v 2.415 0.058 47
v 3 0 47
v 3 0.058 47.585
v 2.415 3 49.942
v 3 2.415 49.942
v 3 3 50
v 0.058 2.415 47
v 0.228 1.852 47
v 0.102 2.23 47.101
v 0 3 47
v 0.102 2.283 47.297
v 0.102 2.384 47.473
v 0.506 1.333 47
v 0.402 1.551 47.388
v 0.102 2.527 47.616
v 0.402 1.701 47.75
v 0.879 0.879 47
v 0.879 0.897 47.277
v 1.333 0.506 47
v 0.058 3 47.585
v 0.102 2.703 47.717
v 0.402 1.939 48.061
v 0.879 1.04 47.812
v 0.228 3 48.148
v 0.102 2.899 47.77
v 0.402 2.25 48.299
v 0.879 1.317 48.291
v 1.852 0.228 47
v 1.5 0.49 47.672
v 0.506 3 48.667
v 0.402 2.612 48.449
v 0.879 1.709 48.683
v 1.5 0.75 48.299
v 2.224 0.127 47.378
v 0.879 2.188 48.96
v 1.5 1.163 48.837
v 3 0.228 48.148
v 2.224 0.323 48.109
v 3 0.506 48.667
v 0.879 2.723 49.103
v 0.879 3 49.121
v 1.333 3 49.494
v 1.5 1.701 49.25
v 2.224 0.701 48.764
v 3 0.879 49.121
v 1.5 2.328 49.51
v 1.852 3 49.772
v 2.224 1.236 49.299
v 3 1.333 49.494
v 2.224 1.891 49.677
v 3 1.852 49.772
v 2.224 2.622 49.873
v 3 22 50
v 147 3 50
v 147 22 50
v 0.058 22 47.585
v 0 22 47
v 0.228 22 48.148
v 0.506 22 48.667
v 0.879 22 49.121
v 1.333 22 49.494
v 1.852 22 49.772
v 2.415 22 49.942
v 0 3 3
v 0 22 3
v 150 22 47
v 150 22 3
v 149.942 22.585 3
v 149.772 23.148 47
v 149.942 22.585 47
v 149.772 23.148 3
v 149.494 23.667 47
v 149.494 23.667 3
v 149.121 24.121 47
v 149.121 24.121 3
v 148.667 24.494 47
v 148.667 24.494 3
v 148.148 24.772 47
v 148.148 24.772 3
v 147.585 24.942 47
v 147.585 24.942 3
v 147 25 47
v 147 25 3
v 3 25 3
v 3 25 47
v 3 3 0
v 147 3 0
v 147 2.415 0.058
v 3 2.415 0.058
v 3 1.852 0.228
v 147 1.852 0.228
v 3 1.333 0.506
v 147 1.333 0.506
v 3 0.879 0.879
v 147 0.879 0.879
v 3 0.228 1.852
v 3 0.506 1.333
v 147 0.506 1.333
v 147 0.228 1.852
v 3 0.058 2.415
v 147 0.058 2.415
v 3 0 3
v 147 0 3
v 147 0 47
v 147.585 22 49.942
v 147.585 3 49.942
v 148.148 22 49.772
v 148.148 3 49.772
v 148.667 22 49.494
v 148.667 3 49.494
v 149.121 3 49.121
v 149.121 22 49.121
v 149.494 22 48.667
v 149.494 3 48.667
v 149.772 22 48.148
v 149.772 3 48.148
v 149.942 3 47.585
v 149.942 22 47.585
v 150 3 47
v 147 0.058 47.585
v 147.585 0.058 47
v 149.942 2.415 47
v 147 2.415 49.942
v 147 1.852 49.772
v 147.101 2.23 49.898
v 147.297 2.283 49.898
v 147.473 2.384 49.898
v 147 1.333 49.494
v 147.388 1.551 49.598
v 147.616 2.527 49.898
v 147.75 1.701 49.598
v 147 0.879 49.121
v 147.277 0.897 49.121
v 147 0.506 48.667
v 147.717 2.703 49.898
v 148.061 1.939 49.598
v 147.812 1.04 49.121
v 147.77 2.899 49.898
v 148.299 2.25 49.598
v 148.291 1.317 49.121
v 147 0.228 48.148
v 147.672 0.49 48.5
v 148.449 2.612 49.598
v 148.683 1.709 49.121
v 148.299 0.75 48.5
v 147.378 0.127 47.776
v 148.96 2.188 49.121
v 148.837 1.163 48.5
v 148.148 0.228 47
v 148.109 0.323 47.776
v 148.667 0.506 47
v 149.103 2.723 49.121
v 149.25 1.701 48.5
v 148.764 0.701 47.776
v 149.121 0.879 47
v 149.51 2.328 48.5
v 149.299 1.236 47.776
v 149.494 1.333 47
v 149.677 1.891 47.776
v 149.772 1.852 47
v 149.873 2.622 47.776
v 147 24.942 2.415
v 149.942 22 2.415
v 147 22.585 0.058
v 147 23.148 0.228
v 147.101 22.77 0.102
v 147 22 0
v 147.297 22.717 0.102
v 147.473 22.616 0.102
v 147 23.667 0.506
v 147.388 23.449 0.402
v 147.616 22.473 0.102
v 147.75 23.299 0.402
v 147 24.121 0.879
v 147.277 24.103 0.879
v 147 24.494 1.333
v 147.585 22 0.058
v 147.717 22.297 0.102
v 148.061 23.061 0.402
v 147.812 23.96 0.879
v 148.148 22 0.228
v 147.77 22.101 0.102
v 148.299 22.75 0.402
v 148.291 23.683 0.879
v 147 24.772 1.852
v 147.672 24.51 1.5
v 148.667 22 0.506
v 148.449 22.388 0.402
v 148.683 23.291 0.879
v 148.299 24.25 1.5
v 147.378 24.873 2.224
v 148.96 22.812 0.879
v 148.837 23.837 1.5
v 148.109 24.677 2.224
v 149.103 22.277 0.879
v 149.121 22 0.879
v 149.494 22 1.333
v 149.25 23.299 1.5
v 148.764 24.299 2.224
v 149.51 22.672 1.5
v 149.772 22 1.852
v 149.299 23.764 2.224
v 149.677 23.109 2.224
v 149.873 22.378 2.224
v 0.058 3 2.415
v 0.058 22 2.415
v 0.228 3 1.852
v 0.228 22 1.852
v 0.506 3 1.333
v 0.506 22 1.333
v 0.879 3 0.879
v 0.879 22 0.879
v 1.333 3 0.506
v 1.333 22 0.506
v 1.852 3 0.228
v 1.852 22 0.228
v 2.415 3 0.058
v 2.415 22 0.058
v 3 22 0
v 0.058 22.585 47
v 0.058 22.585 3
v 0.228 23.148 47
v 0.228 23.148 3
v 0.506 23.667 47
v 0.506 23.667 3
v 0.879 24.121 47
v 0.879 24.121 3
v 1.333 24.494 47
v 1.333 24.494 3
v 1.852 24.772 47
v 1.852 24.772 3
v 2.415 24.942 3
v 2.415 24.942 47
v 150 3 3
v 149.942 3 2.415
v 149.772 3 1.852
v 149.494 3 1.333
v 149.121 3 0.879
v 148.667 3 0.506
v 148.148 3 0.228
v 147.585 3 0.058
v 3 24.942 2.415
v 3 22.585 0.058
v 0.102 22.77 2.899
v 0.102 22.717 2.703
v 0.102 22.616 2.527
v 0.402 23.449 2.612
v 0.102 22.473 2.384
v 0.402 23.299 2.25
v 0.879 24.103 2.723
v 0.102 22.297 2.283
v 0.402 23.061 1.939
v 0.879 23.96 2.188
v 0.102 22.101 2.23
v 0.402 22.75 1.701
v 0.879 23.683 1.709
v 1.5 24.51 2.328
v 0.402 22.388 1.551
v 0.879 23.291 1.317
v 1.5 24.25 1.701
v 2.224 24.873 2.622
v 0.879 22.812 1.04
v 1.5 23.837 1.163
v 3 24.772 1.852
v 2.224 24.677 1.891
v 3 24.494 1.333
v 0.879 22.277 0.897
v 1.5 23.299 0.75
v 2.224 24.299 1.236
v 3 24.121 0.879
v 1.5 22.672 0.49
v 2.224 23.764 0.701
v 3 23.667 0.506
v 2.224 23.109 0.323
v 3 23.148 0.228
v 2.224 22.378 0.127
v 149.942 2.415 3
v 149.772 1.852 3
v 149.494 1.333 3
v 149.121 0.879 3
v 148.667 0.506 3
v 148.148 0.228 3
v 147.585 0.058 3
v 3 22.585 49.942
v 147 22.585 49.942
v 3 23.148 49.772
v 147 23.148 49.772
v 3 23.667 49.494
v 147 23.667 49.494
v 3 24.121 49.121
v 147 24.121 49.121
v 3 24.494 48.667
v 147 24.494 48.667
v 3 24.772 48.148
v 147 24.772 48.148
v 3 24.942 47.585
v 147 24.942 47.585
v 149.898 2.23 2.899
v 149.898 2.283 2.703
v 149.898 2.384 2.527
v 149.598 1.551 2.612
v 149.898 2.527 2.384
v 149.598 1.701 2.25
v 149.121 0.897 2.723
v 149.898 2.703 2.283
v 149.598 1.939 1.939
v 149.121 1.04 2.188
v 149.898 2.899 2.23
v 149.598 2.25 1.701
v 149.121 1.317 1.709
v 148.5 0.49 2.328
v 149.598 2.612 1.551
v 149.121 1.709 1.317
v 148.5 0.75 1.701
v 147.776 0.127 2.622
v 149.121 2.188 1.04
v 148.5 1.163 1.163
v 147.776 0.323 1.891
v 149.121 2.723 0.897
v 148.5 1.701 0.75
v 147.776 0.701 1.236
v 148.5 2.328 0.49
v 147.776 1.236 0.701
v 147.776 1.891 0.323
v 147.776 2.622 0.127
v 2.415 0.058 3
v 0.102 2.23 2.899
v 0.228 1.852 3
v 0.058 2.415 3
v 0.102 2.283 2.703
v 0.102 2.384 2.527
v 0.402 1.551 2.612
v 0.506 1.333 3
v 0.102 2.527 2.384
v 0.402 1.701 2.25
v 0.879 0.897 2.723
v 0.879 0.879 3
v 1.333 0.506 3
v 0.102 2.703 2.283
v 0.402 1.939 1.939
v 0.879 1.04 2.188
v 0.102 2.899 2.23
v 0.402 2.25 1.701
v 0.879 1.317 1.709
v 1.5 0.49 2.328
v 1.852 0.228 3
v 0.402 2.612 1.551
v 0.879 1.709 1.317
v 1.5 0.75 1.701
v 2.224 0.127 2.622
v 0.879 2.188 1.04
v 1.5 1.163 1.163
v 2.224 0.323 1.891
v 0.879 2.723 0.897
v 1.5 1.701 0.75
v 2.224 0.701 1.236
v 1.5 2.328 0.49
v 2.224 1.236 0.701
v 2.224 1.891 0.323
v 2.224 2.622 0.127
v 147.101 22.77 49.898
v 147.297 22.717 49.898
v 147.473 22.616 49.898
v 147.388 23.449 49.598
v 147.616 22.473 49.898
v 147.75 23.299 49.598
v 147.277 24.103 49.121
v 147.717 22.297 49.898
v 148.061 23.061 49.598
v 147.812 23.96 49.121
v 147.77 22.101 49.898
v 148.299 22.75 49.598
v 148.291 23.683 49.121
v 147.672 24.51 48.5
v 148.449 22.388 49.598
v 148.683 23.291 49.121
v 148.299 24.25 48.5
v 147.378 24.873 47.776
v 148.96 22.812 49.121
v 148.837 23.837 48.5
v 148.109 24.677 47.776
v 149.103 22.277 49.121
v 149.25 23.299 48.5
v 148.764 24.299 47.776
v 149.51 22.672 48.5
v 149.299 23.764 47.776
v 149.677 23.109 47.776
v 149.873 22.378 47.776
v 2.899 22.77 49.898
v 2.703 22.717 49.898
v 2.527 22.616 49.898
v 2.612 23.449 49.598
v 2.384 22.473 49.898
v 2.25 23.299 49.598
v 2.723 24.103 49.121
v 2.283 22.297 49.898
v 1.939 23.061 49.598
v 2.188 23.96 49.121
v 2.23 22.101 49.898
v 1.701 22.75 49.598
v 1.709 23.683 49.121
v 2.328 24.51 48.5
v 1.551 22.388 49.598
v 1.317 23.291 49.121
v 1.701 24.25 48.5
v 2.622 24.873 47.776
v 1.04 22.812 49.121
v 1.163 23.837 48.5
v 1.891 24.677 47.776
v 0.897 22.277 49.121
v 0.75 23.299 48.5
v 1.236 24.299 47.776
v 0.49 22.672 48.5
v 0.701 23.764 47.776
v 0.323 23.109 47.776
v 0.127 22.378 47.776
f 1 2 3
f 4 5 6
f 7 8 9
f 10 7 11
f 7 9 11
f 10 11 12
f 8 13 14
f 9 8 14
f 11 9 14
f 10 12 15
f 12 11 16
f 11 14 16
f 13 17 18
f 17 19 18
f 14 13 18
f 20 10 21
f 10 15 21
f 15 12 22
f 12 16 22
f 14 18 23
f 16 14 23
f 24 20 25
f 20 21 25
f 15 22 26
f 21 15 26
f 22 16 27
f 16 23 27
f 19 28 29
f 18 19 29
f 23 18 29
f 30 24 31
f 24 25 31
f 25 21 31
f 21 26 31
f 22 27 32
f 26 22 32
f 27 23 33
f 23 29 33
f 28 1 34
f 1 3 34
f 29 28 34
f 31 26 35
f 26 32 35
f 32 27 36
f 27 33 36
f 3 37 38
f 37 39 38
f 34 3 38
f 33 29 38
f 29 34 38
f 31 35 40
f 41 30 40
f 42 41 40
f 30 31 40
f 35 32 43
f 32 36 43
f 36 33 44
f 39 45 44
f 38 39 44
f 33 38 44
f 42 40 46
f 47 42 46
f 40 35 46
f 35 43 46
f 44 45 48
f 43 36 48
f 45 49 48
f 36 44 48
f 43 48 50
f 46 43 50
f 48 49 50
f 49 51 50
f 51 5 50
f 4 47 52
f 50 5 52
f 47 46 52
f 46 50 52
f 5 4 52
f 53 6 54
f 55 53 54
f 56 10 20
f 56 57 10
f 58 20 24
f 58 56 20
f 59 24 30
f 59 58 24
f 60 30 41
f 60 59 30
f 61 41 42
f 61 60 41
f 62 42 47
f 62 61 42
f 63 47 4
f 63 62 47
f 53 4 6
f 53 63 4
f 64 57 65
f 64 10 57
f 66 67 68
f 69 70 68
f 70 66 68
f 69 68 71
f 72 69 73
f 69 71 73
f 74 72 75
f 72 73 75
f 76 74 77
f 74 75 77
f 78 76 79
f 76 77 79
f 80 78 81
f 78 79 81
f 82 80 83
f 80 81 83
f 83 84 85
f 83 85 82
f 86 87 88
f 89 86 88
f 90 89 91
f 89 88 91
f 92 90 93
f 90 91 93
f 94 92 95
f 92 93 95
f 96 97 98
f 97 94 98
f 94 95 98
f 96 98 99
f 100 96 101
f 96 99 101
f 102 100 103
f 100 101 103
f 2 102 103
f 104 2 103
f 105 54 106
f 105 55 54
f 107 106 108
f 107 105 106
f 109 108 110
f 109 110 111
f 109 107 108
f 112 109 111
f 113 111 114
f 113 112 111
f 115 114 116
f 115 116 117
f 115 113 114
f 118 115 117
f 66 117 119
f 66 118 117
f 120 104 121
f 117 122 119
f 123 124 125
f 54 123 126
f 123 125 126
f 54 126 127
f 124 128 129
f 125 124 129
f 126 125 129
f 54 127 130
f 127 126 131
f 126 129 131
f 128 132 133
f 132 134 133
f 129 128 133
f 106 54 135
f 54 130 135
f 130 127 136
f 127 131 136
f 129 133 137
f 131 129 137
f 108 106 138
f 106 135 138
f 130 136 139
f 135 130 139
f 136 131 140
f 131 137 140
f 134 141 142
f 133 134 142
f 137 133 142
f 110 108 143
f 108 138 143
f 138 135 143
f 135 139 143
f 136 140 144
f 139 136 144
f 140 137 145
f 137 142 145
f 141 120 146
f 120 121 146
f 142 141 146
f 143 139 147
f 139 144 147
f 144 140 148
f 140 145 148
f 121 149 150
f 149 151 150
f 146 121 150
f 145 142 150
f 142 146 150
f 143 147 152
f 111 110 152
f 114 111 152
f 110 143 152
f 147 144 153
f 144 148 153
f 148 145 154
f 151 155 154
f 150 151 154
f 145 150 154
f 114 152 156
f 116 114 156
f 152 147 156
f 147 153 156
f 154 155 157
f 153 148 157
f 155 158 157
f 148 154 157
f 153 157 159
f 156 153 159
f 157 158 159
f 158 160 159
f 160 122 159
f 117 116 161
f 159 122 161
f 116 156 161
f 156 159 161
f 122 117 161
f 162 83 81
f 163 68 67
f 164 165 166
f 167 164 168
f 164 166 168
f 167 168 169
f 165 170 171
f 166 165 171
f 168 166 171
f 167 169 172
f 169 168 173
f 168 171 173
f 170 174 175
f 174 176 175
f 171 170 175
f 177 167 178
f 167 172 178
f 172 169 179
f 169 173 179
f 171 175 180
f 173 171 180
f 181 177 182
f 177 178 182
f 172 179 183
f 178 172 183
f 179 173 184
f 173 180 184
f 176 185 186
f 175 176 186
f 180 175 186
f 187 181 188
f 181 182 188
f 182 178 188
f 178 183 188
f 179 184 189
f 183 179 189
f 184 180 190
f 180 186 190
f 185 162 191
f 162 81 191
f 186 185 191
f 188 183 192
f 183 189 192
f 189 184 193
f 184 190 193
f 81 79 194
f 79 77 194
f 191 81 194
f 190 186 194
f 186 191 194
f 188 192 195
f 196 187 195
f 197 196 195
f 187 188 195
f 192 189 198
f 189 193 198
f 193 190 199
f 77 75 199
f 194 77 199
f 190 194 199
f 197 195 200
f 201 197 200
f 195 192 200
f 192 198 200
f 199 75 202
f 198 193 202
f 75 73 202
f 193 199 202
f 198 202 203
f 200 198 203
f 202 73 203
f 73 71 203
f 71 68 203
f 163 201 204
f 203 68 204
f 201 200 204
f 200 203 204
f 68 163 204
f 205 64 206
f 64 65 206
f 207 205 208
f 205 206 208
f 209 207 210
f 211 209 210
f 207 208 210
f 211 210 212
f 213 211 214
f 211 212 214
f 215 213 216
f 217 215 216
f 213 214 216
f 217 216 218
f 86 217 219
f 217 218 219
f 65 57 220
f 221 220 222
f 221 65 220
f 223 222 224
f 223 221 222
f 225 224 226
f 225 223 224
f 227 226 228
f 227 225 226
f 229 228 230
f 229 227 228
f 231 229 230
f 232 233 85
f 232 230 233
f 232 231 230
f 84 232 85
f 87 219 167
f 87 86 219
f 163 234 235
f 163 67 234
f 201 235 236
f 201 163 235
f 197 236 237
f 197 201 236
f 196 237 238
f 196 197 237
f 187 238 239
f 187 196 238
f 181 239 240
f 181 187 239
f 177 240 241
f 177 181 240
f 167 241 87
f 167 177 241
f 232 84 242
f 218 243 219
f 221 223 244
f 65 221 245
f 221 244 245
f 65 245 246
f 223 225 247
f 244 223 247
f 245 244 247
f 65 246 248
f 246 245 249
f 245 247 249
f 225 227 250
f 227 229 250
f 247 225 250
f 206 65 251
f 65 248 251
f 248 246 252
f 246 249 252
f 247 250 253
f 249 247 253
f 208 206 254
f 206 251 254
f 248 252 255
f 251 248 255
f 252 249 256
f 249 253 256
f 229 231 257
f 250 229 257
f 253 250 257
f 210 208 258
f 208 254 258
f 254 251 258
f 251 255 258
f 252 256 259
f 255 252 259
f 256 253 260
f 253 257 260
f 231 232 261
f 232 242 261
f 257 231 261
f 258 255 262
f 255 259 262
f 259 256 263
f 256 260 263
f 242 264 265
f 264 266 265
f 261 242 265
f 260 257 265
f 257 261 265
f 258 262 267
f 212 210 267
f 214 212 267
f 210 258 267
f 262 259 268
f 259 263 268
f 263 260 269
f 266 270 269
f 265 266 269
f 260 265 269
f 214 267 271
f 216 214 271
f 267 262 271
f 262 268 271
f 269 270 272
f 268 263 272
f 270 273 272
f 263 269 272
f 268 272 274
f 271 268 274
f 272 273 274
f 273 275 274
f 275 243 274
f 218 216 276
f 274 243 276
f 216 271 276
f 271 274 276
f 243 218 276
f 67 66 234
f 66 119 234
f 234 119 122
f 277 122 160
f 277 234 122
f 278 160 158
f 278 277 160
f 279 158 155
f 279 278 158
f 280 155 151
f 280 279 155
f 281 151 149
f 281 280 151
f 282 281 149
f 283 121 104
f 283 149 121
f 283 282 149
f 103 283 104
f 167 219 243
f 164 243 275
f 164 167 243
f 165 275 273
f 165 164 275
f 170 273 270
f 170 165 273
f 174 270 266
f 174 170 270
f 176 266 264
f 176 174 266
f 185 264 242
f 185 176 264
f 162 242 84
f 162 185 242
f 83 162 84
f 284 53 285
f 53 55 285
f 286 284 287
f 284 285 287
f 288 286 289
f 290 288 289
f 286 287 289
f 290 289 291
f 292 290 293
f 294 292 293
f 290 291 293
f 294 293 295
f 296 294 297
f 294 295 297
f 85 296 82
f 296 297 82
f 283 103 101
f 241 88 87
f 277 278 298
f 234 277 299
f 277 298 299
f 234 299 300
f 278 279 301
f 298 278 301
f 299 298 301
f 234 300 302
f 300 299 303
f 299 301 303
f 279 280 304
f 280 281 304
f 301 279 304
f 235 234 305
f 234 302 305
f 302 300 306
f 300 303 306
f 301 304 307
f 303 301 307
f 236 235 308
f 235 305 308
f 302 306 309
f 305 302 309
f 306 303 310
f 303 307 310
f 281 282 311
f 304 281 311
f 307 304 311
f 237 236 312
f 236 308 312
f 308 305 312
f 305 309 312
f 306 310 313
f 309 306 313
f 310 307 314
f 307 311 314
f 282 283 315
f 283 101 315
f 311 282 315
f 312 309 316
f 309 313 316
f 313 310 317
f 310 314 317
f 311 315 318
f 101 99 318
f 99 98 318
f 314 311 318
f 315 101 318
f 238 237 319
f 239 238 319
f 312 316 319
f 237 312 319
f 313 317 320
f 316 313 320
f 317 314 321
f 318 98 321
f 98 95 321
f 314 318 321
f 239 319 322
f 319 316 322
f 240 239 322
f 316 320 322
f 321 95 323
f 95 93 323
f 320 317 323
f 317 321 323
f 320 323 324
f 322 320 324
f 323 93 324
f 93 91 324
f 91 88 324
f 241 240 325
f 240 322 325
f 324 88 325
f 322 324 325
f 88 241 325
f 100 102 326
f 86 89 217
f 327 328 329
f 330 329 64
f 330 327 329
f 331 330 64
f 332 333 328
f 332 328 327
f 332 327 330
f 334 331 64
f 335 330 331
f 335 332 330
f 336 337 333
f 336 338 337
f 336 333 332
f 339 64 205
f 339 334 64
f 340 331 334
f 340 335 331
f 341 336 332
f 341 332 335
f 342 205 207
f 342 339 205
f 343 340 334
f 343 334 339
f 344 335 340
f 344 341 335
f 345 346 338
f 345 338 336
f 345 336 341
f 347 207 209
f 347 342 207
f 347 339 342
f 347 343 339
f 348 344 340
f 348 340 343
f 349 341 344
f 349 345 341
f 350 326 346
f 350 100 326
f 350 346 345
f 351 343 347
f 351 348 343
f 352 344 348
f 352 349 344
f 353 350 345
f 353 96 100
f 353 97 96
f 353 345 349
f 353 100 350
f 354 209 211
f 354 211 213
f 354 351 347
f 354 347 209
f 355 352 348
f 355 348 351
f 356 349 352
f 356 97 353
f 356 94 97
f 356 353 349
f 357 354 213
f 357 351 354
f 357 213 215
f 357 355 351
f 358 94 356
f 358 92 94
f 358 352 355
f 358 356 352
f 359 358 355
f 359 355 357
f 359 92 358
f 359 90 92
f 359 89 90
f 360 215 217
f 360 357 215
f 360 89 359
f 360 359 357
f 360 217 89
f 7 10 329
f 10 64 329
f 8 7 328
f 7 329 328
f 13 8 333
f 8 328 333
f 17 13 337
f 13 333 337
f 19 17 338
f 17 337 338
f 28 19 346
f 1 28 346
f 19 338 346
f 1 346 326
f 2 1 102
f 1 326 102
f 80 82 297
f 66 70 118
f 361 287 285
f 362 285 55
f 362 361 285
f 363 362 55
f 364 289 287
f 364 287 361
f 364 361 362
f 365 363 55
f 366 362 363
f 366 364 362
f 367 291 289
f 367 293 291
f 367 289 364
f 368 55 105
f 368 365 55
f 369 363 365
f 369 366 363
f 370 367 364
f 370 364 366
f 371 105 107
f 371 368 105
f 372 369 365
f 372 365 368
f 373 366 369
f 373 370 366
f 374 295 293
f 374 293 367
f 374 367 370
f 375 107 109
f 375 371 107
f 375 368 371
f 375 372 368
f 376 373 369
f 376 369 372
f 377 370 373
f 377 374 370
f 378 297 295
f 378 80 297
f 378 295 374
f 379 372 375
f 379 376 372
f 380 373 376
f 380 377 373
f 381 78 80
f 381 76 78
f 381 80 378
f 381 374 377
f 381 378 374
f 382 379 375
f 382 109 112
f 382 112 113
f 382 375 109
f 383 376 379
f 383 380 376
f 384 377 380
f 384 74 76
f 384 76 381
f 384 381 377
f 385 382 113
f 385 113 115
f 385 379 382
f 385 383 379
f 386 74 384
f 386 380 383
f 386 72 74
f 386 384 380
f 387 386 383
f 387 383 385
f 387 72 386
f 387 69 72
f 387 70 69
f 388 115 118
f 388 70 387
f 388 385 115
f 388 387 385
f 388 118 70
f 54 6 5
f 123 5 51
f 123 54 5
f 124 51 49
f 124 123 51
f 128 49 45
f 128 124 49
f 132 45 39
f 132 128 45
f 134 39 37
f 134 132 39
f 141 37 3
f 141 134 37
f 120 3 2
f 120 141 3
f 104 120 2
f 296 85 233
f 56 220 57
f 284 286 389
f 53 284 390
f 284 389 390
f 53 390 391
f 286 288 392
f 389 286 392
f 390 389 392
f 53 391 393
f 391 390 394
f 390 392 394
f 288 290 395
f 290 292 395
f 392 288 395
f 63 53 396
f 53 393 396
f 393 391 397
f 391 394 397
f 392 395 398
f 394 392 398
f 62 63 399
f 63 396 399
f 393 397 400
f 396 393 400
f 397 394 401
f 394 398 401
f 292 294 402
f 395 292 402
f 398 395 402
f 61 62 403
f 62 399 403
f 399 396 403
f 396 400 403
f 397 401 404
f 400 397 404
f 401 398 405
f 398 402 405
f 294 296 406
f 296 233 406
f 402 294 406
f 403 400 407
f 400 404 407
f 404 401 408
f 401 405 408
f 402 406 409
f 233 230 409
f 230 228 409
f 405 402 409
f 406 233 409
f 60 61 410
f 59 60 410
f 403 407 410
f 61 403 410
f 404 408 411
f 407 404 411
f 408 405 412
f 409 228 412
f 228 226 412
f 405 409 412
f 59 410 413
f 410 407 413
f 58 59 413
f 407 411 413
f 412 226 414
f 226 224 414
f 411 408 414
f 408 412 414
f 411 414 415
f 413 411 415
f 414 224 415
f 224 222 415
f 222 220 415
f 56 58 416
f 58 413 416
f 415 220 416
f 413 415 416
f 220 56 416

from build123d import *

# Parameters (mm, degrees)
SKETCH_1_W      = 150
SKETCH_1_H      = 50
EXTRUDE_1_DEPTH = 25
FILLET_1_R      = 3


with BuildPart() as part:
    # Эскиз1 → Бобышка-Вытянуть1 (new body)
    with BuildSketch(Plane(origin=(0, 0, 0), x_dir=(1, 0, 0), z_dir=(0, 1, 0))):
        with Locations((75, -25)):
            Rectangle(SKETCH_1_W, SKETCH_1_H)
    extrude(amount=EXTRUDE_1_DEPTH)

    # Скругление1
    fillet_1_edges = [part.edges().sort_by_distance(p)[0] for p in [
        (150, 25, 25),
        (75, 25, 0),
        (0, 25, 25),
        (75, 0, 0),
        (150, 0, 25),
        (75, 0, 50),
        (0, 0, 25),
        (75, 25, 50),
        (0, 12.5, 0),
        (150, 12.5, 0),
        (150, 12.5, 50),
        (0, 12.5, 50),
    ]]
    fillet(fillet_1_edges, radius=FILLET_1_R)


solid = part.part
